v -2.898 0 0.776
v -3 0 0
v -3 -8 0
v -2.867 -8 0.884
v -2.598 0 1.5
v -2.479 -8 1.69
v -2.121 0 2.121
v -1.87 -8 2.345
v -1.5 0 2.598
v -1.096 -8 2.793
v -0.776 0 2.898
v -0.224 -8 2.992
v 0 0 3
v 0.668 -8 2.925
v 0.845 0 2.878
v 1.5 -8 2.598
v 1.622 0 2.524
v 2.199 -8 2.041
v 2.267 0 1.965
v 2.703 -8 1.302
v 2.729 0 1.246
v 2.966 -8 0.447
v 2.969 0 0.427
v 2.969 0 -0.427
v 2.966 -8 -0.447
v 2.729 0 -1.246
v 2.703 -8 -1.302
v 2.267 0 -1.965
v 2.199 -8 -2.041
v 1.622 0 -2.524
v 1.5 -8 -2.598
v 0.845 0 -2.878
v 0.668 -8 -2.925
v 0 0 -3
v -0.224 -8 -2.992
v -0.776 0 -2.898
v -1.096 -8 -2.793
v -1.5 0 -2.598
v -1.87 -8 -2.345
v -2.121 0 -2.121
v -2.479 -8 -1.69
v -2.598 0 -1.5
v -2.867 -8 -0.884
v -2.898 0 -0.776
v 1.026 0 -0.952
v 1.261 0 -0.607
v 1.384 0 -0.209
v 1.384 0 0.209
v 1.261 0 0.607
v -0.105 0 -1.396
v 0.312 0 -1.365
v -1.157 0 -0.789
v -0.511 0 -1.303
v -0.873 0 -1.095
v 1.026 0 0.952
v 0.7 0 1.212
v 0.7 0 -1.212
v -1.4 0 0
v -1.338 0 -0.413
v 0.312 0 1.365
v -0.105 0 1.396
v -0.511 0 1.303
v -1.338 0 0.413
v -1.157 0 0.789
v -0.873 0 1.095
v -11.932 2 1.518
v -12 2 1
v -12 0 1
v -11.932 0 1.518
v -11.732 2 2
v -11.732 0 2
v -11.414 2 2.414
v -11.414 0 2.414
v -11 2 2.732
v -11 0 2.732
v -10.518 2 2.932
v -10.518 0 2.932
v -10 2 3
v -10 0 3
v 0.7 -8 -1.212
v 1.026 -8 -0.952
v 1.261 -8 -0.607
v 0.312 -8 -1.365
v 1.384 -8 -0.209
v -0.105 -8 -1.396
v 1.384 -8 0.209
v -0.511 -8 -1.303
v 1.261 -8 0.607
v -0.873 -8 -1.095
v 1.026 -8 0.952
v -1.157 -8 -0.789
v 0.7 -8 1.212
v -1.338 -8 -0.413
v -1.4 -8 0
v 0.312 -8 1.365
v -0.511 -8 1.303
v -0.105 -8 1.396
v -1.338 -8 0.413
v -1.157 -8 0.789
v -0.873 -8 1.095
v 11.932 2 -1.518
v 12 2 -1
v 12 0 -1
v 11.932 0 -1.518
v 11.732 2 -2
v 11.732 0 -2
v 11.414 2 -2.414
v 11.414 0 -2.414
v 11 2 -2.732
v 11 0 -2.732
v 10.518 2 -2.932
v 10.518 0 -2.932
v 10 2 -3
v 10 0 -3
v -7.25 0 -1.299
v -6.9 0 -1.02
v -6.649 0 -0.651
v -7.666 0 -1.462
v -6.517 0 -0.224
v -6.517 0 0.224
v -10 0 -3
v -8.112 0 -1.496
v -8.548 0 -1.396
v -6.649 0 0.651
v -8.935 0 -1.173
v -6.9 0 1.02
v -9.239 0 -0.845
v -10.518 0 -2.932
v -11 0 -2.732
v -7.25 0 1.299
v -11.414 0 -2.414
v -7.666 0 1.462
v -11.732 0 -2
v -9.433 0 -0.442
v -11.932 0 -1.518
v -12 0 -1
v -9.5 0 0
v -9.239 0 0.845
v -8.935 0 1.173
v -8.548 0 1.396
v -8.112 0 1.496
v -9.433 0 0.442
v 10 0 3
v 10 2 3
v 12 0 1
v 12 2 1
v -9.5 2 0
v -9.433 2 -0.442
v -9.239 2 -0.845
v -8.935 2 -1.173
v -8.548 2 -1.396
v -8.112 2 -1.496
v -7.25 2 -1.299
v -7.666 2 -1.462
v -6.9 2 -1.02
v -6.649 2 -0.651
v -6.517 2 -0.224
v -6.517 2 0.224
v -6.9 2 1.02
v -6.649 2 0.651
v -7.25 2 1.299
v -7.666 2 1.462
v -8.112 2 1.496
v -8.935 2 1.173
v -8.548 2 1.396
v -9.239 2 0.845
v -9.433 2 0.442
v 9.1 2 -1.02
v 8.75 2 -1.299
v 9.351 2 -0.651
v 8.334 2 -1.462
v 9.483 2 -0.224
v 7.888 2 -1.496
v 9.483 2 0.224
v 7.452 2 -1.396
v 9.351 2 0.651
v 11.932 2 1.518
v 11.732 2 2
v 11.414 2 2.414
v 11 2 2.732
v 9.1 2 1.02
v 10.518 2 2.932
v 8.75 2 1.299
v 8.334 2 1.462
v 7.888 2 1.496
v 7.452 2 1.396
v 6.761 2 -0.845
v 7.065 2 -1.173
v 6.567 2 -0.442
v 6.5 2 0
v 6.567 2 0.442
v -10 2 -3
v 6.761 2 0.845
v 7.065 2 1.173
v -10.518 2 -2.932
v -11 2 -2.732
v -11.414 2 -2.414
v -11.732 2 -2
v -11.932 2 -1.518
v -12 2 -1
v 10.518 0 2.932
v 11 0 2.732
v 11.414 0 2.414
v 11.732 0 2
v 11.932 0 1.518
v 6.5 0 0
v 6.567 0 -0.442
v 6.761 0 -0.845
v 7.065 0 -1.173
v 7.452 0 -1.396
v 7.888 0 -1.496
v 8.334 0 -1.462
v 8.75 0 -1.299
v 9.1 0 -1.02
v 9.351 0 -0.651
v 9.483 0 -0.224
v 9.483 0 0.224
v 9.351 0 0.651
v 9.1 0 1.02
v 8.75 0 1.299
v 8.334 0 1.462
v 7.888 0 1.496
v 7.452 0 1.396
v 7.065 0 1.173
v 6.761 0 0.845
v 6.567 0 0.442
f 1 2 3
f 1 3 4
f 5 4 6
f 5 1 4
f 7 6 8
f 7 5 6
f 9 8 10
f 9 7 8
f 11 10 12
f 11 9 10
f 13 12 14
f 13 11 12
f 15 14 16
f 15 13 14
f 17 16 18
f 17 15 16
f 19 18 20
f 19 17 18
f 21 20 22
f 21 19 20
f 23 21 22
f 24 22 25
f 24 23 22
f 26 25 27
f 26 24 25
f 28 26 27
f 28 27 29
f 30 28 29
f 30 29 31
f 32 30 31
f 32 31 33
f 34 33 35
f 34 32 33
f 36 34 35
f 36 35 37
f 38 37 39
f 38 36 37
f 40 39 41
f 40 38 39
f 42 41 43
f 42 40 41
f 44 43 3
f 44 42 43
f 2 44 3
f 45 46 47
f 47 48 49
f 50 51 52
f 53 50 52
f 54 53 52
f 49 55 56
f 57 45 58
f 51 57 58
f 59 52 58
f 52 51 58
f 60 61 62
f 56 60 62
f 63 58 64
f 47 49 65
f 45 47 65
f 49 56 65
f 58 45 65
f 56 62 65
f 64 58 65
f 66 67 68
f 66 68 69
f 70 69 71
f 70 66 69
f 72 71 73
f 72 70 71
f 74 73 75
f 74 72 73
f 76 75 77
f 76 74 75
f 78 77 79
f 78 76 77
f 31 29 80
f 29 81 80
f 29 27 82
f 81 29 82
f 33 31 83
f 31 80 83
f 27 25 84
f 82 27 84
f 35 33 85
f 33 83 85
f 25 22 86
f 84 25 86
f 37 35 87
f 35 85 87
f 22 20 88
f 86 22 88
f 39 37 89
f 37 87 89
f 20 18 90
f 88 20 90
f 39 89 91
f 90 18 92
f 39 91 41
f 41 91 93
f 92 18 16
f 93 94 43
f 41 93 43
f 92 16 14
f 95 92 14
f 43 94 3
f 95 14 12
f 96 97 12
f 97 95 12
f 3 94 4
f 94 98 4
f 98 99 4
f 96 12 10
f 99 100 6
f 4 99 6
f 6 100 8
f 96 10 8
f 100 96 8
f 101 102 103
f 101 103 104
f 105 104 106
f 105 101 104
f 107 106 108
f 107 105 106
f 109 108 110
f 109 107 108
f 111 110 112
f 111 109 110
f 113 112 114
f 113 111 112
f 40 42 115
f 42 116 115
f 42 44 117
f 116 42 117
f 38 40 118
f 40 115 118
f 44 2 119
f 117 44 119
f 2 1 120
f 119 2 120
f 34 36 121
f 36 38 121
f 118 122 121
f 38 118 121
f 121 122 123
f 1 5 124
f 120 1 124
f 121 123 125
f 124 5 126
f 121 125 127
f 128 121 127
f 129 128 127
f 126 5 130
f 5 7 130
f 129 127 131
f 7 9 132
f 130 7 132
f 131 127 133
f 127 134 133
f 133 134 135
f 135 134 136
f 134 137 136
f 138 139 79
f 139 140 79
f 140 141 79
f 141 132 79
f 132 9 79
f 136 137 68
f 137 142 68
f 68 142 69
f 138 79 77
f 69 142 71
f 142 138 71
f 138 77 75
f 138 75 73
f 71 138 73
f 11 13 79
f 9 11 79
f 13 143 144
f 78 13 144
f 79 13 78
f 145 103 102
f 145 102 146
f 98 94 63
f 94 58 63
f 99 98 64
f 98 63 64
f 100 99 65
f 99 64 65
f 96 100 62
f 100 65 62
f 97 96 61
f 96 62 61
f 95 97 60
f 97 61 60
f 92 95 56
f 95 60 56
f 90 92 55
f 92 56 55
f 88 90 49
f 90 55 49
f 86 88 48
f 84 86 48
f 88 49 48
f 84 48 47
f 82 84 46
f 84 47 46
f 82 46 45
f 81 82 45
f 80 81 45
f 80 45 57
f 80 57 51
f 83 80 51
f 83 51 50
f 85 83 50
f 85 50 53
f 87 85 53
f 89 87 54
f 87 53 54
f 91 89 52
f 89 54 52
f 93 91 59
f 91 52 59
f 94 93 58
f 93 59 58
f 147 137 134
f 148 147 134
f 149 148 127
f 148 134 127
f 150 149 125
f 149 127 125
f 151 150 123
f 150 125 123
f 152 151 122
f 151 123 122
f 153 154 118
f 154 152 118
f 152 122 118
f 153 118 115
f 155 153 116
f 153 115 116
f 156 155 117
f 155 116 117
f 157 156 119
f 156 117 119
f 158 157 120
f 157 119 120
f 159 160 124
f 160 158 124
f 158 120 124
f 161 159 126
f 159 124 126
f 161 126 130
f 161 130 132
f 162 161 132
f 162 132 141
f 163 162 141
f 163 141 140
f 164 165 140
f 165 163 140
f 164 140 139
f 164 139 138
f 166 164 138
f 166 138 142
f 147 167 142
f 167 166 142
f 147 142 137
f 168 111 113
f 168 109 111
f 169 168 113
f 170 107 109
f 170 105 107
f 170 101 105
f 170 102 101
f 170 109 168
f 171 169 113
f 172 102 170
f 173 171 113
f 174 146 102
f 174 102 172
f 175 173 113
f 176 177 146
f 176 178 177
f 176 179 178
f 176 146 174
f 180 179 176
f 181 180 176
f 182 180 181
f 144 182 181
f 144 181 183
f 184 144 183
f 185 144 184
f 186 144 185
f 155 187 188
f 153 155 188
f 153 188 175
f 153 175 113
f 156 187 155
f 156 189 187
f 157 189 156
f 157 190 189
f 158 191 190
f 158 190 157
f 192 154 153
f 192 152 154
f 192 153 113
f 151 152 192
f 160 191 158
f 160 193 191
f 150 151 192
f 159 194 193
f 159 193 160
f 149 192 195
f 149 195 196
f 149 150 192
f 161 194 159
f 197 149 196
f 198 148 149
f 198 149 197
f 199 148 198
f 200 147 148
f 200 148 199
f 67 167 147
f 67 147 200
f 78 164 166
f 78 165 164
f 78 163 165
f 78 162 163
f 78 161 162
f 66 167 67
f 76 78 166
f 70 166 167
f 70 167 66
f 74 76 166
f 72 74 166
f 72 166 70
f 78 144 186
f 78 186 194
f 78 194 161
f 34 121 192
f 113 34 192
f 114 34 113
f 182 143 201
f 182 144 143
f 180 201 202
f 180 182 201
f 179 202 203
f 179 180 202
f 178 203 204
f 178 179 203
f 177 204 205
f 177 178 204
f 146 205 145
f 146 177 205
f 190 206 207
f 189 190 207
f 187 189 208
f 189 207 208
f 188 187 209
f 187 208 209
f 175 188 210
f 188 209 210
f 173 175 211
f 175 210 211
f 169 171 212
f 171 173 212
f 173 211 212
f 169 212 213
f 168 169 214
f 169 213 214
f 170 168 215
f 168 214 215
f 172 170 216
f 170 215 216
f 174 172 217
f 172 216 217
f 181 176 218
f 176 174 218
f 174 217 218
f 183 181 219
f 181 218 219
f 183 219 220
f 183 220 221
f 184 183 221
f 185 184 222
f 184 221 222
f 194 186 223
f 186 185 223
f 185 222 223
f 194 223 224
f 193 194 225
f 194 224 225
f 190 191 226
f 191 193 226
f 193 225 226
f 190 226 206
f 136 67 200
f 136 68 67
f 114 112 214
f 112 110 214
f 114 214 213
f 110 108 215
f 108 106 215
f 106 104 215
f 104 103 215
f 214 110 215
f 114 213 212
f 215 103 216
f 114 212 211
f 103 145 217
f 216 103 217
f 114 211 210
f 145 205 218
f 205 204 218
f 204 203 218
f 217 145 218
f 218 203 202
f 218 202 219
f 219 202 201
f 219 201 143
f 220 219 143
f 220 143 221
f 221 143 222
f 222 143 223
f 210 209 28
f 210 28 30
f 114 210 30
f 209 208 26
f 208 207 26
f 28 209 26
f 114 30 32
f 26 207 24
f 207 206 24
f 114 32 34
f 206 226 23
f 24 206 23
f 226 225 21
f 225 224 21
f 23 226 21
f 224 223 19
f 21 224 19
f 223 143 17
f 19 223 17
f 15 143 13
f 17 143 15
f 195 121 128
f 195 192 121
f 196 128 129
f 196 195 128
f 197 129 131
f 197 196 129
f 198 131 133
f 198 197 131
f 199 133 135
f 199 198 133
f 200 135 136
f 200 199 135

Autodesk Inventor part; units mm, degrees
ref_plane "YZ Plane" through (0, 0, 0) normal (1, 0, 0) x (0, 1, 0)
ref_plane "XZ Plane" through (0, 0, 0) normal (0, 1, 0) x (-1, 0, 0)
ref_plane "XY Plane" through (0, 0, 0) normal (0, 0, 1) x (1, 0, 0)
sketch "Sketch1" plane through (0, 0, 0) normal (0, 1, 0) x (-1, 0, 0)
  circle A0 centre (8, 0) radius 1.5
  circle A1 centre (-8, 0) radius 1.5
  line L0 (12, -3) -> (-12, -3)
  line L1 (-12, -3) -> (-12, 3)
  line L2 (-12, 3) -> (12, 3)
  line L3 (12, 3) -> (12, -3)
  circle A2 centre (0, 0) radius 1.4
  circle A3 centre (0, 0) radius 3
  point P0 (-12, 0)
  point P1 (0, 3)
  dimension "d0" = 3
  dimension "d1" = 3
  dimension "d2" = 8
  dimension "d3" = 8
  dimension "d4" = 24
  dimension "d5" = 6
  dimension "d6" = 2.8
extrude "Extrusion1" add sketch "Sketch1" along normal blind 2 contours L0 A3 L2 L3 | L0 L1 L2 A3 | A3 | A2
extrude "Extrusion2" add sketch "Sketch1" against normal blind 8 contours A3
fillet "Fillet2" radius 2 4 edges at (-12, 1, 3) (-12, 1, -3) (12, 1, 3) (12, 1, -3)
properties part number "Shaft Encoder Adapter" material "ABS Plastic"
